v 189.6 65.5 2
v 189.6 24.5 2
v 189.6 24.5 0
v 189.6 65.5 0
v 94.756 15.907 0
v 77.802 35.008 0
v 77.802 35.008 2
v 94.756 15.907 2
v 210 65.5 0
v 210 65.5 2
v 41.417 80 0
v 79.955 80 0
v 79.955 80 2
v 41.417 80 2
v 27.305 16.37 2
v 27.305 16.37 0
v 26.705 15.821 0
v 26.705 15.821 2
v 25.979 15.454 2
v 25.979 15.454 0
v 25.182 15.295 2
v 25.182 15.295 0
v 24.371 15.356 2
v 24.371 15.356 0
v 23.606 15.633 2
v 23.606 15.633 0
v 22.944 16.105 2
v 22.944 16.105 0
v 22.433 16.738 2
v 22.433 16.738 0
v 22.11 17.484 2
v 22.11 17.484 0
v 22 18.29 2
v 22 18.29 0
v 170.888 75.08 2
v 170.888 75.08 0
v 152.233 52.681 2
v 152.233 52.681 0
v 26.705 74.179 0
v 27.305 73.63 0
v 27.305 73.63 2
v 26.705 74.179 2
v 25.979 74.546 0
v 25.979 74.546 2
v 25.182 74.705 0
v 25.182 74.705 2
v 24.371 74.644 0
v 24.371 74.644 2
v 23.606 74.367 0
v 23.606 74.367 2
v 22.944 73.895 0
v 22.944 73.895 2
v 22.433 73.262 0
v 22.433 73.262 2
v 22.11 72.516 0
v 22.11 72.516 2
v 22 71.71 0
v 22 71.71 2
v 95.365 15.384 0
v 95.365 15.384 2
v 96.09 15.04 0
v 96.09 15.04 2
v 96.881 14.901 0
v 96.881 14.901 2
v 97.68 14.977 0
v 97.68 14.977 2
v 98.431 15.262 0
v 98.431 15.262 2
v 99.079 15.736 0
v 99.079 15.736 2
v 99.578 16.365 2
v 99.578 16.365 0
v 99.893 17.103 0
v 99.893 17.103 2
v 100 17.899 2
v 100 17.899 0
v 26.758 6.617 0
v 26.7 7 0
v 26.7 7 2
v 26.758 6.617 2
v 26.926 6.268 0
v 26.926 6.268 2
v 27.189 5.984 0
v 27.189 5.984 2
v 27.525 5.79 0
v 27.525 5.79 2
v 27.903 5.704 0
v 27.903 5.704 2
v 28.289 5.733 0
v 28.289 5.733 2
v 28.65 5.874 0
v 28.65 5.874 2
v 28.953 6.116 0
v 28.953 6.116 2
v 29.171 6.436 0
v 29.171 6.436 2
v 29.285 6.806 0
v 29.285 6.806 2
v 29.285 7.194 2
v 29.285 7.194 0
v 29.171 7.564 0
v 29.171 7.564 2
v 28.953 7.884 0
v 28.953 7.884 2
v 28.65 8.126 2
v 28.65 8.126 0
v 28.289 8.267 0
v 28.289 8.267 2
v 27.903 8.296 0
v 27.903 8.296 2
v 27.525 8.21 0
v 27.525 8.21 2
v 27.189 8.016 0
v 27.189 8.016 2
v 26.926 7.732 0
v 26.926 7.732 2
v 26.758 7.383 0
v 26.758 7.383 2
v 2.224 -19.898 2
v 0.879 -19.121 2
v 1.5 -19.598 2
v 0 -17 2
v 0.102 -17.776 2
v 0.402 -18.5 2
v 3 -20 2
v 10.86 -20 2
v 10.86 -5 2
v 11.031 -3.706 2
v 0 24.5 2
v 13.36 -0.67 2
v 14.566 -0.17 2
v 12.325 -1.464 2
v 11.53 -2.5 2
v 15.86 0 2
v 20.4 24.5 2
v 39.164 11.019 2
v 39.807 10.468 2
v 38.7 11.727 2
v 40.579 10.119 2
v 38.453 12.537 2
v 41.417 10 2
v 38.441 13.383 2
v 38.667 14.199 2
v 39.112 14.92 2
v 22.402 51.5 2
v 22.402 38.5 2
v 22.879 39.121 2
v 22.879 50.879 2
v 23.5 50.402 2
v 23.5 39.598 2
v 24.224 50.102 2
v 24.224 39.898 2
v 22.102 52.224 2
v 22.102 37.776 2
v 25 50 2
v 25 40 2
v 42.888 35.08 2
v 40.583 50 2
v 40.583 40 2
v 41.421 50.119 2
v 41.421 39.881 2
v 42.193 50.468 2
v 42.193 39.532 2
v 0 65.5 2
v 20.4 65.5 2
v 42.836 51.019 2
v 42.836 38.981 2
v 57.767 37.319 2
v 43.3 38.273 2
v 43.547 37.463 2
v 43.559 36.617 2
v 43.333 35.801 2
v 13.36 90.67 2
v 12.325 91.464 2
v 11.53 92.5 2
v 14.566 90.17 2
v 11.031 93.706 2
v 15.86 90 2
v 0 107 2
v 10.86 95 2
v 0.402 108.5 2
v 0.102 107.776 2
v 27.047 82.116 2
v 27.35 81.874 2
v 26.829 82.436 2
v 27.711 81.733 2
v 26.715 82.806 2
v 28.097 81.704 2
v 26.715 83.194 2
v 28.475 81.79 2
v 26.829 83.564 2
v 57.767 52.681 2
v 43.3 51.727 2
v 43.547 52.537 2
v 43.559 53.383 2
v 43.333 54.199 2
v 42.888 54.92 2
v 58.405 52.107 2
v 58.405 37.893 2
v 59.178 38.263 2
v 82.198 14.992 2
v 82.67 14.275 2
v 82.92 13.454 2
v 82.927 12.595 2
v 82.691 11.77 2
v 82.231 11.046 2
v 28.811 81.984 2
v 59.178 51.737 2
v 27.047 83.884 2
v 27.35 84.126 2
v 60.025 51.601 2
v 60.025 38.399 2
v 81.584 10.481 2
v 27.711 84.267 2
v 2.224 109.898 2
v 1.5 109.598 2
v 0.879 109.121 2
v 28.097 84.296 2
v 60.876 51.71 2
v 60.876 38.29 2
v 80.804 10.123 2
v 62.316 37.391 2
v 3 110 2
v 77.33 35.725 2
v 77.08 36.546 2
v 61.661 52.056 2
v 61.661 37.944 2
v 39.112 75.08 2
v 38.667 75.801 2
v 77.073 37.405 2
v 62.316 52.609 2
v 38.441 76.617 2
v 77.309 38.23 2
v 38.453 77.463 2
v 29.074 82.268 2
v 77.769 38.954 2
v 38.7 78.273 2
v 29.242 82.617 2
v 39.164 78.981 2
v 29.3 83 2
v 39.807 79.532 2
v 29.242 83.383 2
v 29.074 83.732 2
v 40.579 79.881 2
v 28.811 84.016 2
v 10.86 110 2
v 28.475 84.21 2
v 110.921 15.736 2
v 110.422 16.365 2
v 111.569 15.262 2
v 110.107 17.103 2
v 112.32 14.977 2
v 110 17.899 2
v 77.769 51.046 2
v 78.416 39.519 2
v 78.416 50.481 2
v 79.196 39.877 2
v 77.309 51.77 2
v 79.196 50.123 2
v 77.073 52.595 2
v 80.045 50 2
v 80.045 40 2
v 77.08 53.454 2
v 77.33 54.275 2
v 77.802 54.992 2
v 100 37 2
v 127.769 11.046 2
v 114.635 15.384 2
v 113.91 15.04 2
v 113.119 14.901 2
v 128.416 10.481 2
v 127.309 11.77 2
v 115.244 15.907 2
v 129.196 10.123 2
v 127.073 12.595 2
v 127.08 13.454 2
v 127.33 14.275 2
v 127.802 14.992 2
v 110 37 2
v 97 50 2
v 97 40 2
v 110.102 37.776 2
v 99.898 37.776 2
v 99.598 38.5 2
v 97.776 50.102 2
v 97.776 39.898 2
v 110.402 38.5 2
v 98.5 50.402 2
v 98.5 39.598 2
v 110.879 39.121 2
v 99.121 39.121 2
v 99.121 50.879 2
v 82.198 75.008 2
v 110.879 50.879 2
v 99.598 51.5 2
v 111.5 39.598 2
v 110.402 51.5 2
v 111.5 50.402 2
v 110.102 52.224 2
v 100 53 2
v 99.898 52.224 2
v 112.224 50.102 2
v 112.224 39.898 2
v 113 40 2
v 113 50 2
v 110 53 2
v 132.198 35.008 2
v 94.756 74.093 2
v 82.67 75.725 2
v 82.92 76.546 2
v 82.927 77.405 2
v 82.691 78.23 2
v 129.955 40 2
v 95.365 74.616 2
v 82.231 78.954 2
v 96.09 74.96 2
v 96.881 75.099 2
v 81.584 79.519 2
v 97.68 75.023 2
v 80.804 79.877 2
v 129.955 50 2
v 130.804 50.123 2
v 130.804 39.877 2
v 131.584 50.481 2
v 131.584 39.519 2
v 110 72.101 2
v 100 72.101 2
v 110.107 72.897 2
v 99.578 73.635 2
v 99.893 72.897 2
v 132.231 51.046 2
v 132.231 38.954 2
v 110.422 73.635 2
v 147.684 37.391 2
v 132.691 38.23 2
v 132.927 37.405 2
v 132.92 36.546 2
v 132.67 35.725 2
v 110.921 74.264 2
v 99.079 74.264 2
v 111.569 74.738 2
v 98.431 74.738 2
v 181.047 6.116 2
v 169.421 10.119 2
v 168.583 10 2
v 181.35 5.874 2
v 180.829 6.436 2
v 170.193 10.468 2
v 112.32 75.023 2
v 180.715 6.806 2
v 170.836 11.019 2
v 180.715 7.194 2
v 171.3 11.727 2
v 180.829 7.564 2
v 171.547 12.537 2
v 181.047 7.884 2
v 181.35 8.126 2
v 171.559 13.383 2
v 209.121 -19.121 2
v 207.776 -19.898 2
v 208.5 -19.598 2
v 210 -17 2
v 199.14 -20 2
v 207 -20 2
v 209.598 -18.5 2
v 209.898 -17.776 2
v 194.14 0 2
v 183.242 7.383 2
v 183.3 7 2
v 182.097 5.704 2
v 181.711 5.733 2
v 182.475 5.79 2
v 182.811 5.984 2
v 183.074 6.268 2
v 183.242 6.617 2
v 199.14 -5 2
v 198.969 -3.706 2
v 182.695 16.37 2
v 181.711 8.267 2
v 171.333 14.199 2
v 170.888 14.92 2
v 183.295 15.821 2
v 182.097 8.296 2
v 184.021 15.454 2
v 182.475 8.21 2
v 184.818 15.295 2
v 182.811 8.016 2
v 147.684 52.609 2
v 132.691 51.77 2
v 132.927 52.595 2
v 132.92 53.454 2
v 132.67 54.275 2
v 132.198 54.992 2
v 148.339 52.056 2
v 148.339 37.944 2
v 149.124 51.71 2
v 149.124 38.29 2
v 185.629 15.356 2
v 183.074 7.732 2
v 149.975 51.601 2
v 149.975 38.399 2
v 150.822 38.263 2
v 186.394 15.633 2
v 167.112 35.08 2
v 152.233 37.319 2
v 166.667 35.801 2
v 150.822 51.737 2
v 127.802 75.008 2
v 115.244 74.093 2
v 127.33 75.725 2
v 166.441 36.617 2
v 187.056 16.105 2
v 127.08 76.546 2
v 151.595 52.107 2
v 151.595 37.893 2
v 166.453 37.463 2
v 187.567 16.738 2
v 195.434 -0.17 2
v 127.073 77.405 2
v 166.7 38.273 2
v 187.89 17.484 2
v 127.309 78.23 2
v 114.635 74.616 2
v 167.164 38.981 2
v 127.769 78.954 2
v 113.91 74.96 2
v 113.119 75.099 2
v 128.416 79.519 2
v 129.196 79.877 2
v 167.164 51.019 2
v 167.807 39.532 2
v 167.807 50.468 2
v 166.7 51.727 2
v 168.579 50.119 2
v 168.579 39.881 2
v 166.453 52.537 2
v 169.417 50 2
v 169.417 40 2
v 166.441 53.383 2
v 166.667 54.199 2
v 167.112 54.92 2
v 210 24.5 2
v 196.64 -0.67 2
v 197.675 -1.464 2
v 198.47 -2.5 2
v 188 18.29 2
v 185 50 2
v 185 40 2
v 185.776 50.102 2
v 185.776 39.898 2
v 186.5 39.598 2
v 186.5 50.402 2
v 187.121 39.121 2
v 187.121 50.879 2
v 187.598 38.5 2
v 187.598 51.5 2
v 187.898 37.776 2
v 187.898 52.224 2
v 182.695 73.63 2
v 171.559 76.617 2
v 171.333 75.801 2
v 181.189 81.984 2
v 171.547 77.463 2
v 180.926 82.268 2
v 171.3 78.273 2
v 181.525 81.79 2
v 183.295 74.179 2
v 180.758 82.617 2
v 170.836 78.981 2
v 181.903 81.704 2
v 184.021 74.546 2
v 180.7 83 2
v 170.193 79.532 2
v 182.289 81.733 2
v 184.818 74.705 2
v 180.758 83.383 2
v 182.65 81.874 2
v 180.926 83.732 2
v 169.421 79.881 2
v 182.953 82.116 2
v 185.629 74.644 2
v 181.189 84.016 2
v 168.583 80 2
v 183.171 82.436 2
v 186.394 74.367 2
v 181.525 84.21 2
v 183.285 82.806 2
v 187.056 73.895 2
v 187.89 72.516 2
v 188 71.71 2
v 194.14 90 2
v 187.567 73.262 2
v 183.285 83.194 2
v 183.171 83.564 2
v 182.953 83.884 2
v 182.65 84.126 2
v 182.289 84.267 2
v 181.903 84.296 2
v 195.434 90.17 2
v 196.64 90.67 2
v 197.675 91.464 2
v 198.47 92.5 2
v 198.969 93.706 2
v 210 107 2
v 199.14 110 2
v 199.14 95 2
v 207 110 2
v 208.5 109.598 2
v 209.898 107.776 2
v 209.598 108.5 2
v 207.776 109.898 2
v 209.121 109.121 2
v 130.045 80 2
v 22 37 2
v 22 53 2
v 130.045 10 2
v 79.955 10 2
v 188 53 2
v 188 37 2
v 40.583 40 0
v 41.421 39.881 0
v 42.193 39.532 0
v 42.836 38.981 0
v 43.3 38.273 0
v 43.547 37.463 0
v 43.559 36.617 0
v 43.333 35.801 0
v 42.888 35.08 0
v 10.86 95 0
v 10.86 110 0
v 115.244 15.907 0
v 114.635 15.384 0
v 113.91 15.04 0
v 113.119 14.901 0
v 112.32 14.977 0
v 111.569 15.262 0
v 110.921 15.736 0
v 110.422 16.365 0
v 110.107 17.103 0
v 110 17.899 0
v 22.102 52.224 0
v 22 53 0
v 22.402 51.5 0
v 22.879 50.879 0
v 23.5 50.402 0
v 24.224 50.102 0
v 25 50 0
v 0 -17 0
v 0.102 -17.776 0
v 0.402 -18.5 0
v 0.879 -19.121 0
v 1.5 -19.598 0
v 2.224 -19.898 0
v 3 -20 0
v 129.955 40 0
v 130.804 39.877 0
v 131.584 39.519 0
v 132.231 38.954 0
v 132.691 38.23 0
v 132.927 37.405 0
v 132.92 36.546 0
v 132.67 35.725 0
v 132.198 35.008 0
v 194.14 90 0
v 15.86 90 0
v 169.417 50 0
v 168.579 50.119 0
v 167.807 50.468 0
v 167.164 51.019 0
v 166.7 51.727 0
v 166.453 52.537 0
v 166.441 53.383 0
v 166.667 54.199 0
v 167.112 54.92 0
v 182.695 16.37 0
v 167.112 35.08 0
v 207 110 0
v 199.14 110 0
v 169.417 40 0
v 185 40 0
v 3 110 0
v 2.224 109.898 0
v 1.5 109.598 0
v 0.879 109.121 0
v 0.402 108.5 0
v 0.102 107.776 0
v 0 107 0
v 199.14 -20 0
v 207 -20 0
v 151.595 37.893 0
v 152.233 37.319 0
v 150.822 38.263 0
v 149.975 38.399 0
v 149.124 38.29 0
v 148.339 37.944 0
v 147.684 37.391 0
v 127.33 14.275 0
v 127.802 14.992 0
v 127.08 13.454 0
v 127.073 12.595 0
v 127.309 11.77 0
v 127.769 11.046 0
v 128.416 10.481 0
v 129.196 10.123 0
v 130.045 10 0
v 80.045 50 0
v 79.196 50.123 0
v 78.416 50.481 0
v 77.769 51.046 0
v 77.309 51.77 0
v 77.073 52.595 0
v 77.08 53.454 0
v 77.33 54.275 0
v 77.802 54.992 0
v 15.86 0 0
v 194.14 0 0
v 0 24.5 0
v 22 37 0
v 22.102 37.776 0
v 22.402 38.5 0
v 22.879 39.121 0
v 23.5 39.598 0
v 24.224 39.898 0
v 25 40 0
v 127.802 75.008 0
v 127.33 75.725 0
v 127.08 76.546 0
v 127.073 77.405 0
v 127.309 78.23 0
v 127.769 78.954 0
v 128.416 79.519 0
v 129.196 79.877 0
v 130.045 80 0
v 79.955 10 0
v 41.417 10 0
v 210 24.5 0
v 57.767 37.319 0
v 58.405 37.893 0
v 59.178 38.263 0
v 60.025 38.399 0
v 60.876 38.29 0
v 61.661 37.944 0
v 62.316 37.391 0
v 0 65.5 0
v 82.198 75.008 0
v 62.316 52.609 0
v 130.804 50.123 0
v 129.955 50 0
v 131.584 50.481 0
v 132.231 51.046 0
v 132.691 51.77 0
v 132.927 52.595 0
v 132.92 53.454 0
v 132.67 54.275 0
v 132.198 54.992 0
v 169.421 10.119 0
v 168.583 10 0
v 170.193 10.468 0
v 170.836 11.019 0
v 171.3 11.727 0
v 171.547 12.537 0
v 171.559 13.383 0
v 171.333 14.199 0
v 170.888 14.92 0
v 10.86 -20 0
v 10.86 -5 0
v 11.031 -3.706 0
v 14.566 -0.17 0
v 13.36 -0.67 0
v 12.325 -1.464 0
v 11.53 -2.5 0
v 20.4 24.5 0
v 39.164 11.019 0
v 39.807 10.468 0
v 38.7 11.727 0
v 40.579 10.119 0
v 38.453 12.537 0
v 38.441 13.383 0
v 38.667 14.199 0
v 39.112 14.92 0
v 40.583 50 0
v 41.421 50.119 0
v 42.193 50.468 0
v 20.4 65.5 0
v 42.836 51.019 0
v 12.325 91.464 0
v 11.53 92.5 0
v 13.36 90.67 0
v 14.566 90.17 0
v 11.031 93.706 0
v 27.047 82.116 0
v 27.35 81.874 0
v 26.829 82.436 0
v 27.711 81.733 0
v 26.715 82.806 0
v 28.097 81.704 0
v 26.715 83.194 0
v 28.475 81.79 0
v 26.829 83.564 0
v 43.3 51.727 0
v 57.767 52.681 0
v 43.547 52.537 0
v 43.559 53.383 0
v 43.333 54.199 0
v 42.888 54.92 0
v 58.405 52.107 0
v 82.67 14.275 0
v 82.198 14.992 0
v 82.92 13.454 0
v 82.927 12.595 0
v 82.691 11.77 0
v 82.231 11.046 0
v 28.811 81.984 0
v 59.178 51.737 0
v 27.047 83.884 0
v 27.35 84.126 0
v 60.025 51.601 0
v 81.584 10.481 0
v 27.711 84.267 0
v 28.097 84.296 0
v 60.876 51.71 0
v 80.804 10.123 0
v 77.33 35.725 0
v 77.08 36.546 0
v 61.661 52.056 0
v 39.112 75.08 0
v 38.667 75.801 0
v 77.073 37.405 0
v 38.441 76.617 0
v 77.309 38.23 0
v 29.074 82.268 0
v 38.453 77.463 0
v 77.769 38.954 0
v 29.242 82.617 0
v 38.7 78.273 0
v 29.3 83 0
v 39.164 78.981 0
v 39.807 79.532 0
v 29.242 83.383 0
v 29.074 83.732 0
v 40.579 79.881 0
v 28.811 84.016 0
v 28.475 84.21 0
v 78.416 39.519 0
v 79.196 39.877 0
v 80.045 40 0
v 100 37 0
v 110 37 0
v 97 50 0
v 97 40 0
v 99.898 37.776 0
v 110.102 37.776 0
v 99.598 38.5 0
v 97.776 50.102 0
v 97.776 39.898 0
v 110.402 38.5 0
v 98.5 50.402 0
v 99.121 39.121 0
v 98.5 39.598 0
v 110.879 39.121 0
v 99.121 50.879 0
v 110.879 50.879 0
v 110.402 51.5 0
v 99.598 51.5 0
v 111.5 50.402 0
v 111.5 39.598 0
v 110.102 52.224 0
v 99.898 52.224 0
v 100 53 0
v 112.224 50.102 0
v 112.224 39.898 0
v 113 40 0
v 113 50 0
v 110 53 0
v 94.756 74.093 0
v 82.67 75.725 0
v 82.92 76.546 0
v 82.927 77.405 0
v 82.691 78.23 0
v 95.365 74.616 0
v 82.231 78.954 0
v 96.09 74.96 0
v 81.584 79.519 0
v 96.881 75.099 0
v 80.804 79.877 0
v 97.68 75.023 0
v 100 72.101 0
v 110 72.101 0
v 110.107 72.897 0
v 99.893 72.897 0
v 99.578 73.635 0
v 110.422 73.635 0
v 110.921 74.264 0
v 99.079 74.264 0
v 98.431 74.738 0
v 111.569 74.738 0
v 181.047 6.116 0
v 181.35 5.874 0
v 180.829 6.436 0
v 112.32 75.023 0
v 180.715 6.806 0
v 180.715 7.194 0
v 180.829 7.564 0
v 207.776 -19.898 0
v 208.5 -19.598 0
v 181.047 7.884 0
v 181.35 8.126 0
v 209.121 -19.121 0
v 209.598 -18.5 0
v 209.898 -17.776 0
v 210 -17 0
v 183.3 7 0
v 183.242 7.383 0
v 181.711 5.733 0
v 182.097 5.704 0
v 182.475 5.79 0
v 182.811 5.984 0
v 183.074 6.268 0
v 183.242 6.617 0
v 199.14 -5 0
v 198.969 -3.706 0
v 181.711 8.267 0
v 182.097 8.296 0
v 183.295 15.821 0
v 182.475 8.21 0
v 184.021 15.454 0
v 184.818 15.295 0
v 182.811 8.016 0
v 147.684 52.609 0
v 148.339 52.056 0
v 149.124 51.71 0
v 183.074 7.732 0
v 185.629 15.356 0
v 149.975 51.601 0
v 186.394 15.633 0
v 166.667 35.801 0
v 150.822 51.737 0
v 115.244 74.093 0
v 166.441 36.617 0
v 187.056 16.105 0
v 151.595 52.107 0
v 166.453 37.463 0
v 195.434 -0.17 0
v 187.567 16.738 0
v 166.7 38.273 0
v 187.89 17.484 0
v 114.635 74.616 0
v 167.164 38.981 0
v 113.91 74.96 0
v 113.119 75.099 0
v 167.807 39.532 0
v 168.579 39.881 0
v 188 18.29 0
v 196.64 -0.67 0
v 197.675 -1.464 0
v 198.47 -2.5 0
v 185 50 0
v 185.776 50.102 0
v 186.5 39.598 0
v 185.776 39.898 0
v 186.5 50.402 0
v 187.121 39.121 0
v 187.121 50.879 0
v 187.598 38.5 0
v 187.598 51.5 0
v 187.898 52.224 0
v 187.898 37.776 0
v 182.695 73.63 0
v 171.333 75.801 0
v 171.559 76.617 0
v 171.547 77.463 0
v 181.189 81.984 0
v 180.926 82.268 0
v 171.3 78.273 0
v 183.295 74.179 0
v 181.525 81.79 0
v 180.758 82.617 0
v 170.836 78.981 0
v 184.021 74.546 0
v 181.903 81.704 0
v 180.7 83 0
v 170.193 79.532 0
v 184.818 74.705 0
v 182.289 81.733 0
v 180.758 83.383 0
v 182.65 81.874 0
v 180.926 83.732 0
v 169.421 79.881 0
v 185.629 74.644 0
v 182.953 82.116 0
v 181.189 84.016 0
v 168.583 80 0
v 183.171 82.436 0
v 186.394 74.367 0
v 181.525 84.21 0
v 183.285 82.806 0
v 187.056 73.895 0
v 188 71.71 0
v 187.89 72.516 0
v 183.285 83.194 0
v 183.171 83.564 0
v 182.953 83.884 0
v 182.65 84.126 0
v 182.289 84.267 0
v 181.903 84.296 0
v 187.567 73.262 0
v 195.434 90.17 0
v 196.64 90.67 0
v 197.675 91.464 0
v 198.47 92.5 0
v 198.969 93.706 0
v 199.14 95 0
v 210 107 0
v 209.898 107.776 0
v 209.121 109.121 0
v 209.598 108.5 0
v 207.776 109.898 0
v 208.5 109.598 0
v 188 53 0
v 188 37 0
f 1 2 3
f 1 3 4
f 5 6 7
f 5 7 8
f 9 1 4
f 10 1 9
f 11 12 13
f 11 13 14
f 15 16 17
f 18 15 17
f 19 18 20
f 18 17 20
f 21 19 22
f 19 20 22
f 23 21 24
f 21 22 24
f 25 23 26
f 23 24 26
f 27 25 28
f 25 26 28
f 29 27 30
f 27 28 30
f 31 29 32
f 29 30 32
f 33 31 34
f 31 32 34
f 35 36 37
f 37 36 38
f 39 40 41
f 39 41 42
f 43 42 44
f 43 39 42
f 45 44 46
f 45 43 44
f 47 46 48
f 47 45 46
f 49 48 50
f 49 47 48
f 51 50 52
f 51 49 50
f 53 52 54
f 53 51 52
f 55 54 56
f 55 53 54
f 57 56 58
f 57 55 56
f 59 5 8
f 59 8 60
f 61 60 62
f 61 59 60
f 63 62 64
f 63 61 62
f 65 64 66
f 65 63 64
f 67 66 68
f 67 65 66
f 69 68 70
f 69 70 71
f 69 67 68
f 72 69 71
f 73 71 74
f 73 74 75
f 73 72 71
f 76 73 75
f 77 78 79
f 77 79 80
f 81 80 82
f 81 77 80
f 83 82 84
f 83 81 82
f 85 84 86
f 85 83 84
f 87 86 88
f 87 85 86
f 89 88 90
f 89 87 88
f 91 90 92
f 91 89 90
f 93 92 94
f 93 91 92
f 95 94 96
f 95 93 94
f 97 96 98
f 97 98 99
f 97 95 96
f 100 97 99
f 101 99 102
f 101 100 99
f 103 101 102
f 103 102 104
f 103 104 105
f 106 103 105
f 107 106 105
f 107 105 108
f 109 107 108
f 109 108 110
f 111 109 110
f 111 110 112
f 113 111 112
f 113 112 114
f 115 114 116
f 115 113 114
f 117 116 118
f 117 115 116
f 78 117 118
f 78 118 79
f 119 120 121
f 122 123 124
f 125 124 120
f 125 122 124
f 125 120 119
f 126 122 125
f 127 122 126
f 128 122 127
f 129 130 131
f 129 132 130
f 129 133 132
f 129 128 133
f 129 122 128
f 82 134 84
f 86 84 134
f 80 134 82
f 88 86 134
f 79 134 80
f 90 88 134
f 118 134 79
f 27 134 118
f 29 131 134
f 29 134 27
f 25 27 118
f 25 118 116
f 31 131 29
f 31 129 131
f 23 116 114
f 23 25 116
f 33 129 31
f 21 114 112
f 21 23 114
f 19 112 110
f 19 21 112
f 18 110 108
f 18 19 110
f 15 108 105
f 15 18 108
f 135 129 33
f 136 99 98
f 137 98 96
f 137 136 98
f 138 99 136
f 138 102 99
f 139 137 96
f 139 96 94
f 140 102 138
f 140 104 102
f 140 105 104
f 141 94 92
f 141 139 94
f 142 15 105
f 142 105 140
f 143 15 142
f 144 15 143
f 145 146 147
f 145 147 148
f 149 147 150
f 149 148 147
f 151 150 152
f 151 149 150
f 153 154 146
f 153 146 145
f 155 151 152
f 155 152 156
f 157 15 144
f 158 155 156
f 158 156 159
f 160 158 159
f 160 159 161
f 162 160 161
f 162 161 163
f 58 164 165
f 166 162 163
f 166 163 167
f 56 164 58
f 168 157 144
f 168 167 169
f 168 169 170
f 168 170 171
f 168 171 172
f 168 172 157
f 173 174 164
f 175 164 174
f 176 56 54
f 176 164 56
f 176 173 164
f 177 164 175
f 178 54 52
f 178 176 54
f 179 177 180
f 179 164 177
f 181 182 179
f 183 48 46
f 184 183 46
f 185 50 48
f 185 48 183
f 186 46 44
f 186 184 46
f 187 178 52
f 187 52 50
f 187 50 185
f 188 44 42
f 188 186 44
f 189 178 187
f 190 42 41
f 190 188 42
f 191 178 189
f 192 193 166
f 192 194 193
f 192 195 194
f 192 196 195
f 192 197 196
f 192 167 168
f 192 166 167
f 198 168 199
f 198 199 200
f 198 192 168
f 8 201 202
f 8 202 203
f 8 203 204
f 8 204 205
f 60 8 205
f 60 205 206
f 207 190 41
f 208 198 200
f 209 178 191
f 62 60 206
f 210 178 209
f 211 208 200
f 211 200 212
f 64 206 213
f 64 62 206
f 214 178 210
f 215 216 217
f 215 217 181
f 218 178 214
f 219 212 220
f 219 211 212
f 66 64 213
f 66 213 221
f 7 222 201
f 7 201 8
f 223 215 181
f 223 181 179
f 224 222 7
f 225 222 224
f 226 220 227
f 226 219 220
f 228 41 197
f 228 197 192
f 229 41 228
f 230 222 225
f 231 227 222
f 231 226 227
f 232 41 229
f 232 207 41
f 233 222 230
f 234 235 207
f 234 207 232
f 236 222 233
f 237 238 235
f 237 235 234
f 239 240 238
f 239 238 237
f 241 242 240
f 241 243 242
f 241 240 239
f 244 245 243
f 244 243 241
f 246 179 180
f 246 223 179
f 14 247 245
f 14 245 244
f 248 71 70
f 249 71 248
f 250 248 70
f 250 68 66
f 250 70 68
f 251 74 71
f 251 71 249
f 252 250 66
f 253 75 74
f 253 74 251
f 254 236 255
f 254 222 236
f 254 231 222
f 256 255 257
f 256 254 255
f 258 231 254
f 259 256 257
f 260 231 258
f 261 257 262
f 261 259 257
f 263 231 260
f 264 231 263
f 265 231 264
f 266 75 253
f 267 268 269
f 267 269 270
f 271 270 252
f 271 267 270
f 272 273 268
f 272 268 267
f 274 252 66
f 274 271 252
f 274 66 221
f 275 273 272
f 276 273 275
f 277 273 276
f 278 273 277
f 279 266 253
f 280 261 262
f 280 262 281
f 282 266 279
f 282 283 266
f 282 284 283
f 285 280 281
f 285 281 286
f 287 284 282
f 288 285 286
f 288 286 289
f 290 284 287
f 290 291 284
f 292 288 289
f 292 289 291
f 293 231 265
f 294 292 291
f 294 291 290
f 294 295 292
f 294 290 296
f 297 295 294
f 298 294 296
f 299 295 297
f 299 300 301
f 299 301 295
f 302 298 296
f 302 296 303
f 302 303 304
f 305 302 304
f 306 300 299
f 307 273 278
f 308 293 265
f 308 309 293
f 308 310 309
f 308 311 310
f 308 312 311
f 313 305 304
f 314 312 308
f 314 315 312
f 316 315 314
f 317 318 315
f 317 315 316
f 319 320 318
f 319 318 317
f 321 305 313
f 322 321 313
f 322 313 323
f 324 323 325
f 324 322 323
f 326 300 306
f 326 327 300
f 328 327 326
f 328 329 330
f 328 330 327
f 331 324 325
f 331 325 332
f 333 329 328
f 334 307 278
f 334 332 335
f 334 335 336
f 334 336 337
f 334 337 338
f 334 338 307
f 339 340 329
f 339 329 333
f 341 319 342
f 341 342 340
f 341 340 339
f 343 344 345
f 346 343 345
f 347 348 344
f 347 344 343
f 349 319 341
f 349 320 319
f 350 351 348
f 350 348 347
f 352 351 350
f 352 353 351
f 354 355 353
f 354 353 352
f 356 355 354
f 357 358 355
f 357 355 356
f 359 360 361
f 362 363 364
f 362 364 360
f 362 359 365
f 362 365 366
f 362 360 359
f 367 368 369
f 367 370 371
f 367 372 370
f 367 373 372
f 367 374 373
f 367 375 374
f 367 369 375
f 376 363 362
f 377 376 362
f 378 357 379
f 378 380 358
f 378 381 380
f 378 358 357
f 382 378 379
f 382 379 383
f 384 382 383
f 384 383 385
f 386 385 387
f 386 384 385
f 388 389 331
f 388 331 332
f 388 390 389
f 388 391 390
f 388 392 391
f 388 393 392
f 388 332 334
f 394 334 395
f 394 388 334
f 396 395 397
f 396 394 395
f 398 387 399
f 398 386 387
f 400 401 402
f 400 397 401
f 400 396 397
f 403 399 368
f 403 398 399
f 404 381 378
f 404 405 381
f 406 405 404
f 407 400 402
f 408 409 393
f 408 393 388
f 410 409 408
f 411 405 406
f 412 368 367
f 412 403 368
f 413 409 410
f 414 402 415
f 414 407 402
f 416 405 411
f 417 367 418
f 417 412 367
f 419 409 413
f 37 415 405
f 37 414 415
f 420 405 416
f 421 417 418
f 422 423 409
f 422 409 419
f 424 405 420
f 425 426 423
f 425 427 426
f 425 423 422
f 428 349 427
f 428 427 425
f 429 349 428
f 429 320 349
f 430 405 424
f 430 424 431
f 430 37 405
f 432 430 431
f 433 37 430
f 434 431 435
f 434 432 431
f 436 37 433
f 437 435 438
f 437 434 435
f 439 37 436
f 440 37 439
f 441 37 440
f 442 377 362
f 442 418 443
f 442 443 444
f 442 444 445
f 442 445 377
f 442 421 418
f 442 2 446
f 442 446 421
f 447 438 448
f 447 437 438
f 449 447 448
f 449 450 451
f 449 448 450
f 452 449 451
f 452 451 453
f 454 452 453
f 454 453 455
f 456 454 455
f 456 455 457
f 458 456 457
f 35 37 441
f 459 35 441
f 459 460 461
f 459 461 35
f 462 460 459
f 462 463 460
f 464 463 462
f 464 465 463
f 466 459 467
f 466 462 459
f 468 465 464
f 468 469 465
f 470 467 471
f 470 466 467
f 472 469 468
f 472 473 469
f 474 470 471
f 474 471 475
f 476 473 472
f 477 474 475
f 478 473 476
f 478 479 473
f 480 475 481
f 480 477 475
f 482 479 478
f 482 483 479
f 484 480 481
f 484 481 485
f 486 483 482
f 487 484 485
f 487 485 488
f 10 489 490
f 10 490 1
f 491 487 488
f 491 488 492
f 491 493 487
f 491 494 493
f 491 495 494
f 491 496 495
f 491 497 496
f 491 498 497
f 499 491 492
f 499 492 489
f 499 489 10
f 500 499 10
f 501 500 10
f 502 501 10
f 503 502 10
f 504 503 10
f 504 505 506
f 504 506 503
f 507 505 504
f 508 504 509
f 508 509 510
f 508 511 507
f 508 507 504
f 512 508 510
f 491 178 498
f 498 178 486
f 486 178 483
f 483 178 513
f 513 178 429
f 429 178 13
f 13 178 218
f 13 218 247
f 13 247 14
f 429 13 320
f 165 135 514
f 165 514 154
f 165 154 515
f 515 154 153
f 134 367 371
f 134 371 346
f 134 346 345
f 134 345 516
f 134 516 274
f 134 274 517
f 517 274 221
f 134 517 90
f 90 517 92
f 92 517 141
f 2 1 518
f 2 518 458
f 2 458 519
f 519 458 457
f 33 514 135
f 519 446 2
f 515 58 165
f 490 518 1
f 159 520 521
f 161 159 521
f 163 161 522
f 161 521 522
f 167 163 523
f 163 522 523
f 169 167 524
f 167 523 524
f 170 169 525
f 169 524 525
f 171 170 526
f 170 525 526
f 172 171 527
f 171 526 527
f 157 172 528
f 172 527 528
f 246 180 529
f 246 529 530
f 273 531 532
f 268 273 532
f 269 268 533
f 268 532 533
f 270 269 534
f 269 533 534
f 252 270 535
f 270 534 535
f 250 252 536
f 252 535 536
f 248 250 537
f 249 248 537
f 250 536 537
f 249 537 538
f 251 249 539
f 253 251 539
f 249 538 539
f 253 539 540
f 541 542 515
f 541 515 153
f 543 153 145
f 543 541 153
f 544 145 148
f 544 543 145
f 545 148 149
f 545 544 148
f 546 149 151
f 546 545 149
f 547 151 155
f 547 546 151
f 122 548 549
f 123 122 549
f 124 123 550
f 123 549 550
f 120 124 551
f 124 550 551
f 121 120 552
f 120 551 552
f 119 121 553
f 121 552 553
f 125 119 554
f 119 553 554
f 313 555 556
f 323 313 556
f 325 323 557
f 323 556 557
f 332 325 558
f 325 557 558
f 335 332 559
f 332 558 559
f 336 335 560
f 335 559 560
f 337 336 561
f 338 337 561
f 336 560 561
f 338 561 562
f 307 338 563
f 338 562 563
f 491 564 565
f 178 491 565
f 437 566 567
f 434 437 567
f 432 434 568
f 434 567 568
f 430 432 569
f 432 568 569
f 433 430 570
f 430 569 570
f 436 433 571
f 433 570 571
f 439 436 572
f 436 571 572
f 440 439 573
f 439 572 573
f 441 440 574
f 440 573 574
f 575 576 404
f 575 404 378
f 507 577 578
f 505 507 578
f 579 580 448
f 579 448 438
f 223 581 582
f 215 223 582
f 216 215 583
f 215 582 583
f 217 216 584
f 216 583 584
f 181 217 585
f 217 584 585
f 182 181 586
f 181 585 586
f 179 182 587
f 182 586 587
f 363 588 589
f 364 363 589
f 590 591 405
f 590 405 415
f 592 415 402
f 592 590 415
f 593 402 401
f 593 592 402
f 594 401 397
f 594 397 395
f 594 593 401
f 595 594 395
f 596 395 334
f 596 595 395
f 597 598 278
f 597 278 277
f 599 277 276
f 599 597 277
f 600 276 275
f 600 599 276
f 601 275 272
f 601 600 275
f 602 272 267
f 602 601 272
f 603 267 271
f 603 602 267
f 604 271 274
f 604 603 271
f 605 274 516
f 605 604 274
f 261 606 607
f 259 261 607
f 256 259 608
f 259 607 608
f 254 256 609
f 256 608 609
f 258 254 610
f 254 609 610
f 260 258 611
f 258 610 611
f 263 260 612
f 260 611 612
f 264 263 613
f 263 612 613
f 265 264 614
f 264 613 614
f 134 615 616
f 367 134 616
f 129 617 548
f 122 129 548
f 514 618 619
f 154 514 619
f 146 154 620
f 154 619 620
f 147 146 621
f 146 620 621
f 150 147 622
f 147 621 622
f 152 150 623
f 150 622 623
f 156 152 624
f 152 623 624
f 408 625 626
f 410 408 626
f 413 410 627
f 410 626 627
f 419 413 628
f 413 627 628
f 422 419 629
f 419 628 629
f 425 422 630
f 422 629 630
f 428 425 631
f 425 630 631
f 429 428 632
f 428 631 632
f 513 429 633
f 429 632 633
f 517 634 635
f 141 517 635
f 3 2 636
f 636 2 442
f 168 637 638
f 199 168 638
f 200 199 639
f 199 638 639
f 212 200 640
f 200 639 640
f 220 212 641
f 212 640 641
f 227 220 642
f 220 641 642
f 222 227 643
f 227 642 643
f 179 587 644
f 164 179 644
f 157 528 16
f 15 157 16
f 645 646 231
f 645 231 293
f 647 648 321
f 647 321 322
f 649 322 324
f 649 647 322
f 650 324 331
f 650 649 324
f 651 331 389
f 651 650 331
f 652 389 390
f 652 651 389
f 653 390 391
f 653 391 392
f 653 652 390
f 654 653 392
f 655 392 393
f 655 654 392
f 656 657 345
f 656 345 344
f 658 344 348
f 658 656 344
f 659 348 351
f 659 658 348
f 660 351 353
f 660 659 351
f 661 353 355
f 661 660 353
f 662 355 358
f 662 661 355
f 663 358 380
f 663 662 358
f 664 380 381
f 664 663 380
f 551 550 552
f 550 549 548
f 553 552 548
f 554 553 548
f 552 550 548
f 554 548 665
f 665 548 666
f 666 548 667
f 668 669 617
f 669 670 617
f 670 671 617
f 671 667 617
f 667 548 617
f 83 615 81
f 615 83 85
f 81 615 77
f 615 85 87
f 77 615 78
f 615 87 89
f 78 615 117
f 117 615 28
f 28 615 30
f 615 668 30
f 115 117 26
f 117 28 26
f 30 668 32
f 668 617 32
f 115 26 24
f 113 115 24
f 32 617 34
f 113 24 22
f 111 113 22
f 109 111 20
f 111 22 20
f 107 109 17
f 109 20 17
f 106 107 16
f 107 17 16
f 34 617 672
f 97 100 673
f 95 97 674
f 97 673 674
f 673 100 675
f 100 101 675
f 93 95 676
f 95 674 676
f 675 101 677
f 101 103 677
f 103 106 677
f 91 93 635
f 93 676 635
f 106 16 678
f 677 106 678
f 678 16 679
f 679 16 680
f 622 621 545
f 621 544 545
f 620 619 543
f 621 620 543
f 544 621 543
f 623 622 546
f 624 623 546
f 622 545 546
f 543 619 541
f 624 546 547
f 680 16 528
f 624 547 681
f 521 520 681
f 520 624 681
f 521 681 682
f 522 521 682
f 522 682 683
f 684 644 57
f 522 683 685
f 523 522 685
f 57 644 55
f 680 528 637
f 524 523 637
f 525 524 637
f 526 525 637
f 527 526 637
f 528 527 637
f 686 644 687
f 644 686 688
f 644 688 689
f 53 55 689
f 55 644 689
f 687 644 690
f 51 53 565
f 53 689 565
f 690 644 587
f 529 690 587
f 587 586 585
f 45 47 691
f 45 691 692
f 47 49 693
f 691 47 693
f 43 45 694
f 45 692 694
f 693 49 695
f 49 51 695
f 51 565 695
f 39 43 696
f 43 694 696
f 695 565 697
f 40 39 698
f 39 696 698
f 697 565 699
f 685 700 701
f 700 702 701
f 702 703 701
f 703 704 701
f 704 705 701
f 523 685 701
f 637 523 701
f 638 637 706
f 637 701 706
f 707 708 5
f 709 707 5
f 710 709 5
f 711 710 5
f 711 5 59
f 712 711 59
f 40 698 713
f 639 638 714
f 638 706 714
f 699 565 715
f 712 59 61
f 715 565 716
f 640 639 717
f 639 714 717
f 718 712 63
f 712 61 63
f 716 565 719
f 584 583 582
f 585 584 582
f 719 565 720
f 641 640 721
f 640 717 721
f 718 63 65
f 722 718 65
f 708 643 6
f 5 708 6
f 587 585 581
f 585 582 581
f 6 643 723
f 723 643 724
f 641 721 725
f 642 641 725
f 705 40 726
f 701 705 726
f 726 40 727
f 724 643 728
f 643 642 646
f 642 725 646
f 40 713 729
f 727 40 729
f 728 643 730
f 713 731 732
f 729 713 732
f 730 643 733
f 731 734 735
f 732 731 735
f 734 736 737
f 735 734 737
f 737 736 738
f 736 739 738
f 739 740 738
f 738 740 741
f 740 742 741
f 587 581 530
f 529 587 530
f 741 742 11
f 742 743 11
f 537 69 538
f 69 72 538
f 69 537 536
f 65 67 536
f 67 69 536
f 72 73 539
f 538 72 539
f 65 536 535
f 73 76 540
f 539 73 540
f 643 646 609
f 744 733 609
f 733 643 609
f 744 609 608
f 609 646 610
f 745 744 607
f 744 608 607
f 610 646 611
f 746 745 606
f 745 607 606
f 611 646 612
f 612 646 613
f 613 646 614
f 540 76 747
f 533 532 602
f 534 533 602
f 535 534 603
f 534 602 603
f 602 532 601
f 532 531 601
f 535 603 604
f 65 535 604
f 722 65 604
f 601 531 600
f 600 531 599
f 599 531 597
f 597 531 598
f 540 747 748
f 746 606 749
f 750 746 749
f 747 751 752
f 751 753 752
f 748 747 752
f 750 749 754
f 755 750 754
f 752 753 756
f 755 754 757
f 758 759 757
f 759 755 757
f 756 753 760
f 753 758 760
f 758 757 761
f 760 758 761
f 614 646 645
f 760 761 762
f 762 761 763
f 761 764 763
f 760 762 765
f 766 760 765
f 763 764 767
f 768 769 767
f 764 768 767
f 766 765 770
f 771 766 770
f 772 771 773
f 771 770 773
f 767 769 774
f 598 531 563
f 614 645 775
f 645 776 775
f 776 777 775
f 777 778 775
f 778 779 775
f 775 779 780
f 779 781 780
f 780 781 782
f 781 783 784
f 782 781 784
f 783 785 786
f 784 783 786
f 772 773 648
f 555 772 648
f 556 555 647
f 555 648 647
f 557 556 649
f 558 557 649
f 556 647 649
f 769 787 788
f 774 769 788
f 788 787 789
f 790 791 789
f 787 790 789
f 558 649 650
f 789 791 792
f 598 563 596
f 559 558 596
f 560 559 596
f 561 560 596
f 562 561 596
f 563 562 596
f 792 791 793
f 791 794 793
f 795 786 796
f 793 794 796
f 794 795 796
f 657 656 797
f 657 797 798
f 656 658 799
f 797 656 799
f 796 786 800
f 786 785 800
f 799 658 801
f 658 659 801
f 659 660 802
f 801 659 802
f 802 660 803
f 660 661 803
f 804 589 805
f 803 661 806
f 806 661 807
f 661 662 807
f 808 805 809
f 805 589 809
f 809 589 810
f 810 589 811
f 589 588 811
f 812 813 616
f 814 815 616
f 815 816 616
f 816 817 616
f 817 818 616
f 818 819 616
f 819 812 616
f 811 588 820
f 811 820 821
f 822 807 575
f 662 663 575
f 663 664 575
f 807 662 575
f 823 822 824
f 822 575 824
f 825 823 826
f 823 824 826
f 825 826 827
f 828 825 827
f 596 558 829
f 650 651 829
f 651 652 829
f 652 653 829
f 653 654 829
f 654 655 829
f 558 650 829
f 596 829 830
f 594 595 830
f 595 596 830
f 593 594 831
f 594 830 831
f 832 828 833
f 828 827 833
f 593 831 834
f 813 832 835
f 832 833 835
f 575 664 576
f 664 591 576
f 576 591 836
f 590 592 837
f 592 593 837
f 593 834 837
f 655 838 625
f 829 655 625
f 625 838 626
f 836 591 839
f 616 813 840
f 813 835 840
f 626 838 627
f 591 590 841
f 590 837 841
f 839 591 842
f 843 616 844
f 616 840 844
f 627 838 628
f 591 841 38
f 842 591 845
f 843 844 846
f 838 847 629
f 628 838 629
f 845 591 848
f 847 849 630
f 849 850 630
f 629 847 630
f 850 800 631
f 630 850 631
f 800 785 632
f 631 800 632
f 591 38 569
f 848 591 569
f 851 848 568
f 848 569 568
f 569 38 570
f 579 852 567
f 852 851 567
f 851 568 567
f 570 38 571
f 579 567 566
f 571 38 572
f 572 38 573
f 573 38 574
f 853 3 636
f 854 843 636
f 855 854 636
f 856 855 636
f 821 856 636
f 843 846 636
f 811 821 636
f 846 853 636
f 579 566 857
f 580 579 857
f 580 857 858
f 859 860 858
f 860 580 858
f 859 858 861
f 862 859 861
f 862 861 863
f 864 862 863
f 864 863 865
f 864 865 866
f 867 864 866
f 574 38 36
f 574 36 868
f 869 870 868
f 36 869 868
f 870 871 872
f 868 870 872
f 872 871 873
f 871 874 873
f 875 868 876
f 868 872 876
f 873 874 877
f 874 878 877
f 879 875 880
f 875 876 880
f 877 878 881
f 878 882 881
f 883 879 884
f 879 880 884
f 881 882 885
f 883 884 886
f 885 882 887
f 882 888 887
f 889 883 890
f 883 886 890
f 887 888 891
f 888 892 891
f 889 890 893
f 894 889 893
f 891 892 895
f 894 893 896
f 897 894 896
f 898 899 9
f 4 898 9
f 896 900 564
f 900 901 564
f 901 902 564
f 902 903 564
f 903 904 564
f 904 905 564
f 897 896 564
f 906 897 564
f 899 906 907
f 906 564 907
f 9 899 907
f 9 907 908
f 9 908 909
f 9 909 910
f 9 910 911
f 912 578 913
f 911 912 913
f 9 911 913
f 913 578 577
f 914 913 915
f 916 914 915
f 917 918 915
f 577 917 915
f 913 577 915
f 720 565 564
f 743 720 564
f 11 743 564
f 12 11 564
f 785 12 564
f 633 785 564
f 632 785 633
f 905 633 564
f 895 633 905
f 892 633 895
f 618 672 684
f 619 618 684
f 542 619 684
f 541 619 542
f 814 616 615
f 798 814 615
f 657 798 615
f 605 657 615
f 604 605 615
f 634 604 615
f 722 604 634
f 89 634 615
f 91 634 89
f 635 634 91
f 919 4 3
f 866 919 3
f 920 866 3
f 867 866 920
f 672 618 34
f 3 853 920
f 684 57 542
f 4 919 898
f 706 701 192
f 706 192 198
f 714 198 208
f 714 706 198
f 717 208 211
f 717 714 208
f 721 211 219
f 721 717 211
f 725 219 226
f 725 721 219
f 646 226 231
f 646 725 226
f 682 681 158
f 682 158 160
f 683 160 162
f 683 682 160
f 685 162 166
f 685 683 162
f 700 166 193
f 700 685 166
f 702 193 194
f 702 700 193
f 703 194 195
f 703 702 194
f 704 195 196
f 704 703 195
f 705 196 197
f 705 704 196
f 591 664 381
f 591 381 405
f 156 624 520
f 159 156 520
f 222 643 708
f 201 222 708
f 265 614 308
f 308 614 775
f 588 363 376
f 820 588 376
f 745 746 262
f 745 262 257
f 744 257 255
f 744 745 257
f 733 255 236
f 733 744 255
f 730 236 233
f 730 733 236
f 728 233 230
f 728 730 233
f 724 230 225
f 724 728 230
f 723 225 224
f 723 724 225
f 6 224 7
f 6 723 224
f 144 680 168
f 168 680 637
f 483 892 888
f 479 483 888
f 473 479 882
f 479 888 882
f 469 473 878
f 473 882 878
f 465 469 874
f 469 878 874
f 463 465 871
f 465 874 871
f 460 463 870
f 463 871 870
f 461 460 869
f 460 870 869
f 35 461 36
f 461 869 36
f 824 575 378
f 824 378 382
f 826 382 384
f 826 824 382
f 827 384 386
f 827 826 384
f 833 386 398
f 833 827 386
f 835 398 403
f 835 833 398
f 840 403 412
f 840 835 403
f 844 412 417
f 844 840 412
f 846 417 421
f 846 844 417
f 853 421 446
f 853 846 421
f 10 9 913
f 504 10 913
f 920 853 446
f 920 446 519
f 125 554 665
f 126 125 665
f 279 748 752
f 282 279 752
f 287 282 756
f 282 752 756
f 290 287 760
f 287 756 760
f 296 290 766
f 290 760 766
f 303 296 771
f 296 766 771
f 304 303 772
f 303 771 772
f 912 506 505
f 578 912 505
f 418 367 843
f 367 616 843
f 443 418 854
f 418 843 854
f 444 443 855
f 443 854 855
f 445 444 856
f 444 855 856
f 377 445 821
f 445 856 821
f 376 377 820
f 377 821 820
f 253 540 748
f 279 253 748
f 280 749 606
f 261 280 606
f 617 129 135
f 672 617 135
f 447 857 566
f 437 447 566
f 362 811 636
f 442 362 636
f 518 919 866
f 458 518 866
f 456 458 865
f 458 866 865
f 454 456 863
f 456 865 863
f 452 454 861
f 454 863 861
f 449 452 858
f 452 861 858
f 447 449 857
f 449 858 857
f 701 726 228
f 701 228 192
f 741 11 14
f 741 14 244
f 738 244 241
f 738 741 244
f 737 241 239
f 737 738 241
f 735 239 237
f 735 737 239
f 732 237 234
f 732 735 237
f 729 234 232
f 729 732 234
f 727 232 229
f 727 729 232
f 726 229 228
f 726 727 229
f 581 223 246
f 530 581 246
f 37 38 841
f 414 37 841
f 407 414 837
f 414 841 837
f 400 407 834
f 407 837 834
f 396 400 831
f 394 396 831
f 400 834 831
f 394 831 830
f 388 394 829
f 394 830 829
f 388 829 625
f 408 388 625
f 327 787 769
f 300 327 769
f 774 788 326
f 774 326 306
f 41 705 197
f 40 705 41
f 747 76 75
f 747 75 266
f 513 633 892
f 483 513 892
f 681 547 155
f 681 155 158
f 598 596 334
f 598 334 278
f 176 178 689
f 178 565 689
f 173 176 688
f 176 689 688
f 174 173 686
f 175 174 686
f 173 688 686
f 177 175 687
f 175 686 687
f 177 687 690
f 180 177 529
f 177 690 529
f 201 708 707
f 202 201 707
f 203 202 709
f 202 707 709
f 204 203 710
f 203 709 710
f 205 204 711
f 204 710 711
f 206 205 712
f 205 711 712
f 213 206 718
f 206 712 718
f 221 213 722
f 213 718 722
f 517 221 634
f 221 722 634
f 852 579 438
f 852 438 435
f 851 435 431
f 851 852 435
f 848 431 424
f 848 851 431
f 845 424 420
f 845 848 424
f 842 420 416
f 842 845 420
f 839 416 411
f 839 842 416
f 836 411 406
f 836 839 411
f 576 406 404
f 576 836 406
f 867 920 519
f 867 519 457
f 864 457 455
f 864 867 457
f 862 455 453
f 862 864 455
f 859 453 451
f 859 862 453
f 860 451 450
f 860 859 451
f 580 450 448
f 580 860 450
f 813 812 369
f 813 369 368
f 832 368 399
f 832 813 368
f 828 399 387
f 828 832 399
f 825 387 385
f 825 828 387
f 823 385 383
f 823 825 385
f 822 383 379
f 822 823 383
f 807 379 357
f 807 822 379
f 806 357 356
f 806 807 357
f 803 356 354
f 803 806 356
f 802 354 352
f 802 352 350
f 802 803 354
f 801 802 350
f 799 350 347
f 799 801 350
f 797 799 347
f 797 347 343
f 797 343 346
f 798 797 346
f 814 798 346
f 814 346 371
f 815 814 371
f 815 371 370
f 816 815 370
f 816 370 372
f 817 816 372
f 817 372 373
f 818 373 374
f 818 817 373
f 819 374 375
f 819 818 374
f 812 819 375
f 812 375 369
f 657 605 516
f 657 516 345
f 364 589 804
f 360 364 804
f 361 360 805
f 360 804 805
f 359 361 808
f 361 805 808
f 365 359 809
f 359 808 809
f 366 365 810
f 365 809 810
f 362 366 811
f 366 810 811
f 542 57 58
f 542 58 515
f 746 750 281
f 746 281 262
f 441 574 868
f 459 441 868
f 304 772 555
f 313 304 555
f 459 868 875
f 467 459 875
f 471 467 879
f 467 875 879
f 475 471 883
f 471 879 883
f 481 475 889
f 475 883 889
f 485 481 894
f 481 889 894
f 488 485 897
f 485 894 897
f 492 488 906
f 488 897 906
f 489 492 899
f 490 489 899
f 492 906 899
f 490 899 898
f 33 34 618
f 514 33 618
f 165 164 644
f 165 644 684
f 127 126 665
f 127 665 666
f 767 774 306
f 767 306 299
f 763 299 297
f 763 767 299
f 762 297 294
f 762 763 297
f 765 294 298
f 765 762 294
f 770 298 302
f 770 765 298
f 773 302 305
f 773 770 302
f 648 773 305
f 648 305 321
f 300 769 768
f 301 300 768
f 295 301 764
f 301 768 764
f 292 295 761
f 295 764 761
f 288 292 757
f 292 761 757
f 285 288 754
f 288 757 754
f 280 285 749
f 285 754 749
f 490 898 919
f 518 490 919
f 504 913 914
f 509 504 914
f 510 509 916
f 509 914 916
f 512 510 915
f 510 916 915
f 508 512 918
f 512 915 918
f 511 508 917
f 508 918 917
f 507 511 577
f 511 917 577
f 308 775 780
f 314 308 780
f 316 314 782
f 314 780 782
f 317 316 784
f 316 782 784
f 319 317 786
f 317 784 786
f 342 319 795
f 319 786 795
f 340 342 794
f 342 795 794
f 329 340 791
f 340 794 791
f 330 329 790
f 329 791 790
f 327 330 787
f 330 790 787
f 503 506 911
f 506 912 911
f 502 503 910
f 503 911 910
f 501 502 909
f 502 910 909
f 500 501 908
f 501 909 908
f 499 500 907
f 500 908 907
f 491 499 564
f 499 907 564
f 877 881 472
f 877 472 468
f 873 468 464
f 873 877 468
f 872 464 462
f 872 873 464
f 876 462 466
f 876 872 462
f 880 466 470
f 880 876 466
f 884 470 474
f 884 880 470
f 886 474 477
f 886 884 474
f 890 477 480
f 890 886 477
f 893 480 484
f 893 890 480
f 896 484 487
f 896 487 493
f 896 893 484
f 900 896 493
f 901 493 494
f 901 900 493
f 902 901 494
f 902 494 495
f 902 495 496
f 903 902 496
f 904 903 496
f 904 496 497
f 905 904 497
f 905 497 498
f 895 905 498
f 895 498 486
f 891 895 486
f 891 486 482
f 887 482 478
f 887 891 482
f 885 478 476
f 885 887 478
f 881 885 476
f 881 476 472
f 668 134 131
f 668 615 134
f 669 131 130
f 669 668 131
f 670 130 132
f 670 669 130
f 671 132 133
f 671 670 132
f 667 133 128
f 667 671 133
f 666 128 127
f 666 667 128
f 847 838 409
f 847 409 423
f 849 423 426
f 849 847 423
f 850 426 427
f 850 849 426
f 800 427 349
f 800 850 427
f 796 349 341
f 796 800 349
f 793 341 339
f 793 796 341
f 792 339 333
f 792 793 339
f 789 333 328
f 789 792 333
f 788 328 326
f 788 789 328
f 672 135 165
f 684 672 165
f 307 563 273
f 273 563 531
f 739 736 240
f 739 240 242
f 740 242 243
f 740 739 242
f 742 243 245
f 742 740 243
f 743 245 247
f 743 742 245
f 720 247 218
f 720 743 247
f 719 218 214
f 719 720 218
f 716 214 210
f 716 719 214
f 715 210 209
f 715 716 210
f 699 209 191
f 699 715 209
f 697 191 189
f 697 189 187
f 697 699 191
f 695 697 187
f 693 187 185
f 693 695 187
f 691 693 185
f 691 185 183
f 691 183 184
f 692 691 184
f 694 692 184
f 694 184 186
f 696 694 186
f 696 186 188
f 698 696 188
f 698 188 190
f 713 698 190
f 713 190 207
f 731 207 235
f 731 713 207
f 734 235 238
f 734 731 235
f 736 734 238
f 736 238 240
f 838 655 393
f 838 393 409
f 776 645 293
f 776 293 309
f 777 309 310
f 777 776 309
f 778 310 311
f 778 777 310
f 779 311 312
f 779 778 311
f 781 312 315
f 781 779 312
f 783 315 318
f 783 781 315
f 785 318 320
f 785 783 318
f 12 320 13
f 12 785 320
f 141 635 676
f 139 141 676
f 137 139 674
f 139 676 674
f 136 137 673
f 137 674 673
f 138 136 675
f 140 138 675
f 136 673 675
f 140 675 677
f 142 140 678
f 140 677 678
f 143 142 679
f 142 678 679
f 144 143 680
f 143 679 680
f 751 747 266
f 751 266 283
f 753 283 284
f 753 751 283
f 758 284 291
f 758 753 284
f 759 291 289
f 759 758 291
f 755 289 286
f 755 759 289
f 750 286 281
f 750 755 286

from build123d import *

# Parameters (mm, degrees)
SKETCH_1_R          = 1.75
SKETCH_1_R_2        = 1.3
EXTRUDE_1_DEPTH     = 2
SKETCH_2_W          = 20.4
SKETCH_2_H          = 41
CUT_EXTRUDE_1_DEPTH = 238.073828163
SKETCH_3_W          = 6.060289077
SKETCH_3_H          = 20
EXTRUDE_2_DEPTH     = 2
FILLET_3_R          = 5
FILLET_4_R          = 5
FILLET_5_R          = 5
FILLET_6_R          = 5


with BuildPart() as part:
    # 草图1 → 凸台-拉伸1 (new body)
    with BuildSketch(Plane.XY):
        with BuildLine():
            Line((7.8, 0), (202.2, 0))
            ThreePointArc((202.2, 0), (204.321320344, -0.878679656), (205.2, -3))
            Line((205.2, -3), (205.2, -20))
            Line((205.2, -20), (207, -20))
            ThreePointArc((207, -20), (209.121320344, -19.121320344), (210, -17))
            Line((210, -17), (210, 0))
            Line((210, 0), (210, 90))
            Line((210, 90), (210, 107))
            ThreePointArc((210, 107), (209.121320344, 109.121320344), (207, 110))
            Line((207, 110), (205.2, 110))
            Line((205.2, 110), (205.2, 93))
            ThreePointArc((205.2, 93), (204.321320344, 90.878679656), (202.2, 90))
            Line((202.2, 90), (7.8, 90))
            ThreePointArc((7.8, 90), (5.678679656, 90.878679656), (4.8, 93))
            Line((4.8, 93), (4.8, 110))
            Line((4.8, 110), (3, 110))
            ThreePointArc((3, 110), (0.878679656, 109.121320344), (0, 107))
            Line((0, 107), (0, 90))
            Line((0, 90), (0, 0))
            Line((0, 0), (0, -17))
            ThreePointArc((0, -17), (0.878679656, -19.121320344), (3, -20))
            Line((3, -20), (4.8, -20))
            Line((4.8, -20), (4.8, -3))
            ThreePointArc((4.8, -3), (5.678679656, -0.878679656), (7.8, 0))
        make_face()
        with Locations((2.5, 53)):
            Circle(SKETCH_1_R, mode=Mode.SUBTRACT)
        with Locations(Location((17.5, 53, 0), (0, 0, 180))):
            Circle(SKETCH_1_R, mode=Mode.SUBTRACT)
        with Locations((17.5, 37)):
            Circle(SKETCH_1_R, mode=Mode.SUBTRACT)
        with Locations(Location((2.5, 37, 0), (0, 0, 180))):
            Circle(SKETCH_1_R, mode=Mode.SUBTRACT)
        with Locations((207.5, 37)):
            Circle(SKETCH_1_R, mode=Mode.SUBTRACT)
        with Locations(Location((192.5, 37, 0), (0, 0, 180))):
            Circle(SKETCH_1_R, mode=Mode.SUBTRACT)
        with Locations((192.5, 53)):
            Circle(SKETCH_1_R, mode=Mode.SUBTRACT)
        with Locations(Location((207.5, 53, 0), (0, 0, 180))):
            Circle(SKETCH_1_R, mode=Mode.SUBTRACT)
        with Locations((28, 83)):
            Circle(SKETCH_1_R_2, mode=Mode.SUBTRACT)
        with Locations(Location((182, 83, 0), (0, 0, 180))):
            Circle(SKETCH_1_R_2, mode=Mode.SUBTRACT)
        with Locations((182, 7)):
            Circle(SKETCH_1_R_2, mode=Mode.SUBTRACT)
        with Locations(Location((28, 7, 0), (0, 0, 180))):
            Circle(SKETCH_1_R_2, mode=Mode.SUBTRACT)
        with BuildLine():
            Line((22, 71.710263165), (22, 53))
            ThreePointArc((22, 53), (22.878679656, 50.878679656), (25, 50))
            Line((25, 50), (40.583105292, 50))
            ThreePointArc((40.583105292, 50), (43.299697276, 51.727157515), (42.888301086, 54.919914673))
            Line((42.888301086, 54.919914673), (27.305195794, 73.630177837))
            ThreePointArc((27.305195794, 73.630177837), (23.979114939, 74.531219331), (22, 71.710263165))
        make_face(mode=Mode.SUBTRACT)
        with BuildLine():
            Line((39.111698914, 75.080085327), (57.767217115, 52.680849201))
            ThreePointArc((57.767217115, 52.680849201), (60.025200787, 51.601135394), (62.316045524, 52.60925372))
            Line((62.316045524, 52.60925372), (82.19822493, 75.008489847))
            ThreePointArc((82.19822493, 75.008489847), (82.690879074, 78.229932832), (79.954592315, 80))
            Line((79.954592315, 80), (41.416894708, 80))
            ThreePointArc((41.416894708, 80), (38.700302724, 78.272842485), (39.111698914, 75.080085327))
        make_face(mode=Mode.SUBTRACT)
        with BuildLine():
            Line((100, 72.101020514), (100, 53))
            ThreePointArc((100, 53), (99.121320344, 50.878679656), (97, 50))
            Line((97, 50), (80.045407685, 50))
            ThreePointArc((80.045407685, 50), (77.309120926, 51.770067168), (77.80177507, 54.991510153))
            Line((77.80177507, 54.991510153), (94.756367385, 74.092530668))
            ThreePointArc((94.756367385, 74.092530668), (98.065153077, 74.905561283), (100, 72.101020514))
        make_face(mode=Mode.SUBTRACT)
        with BuildLine():
            Line((113, 50), (129.954592315, 50))
            ThreePointArc((129.954592315, 50), (132.690879074, 51.770067168), (132.19822493, 54.991510153))
            Line((132.19822493, 54.991510153), (115.243632615, 74.092530668))
            ThreePointArc((115.243632615, 74.092530668), (111.934846923, 74.905561283), (110, 72.101020514))
            Line((110, 72.101020514), (110, 53))
            ThreePointArc((110, 53), (110.878679656, 50.878679656), (113, 50))
        make_face(mode=Mode.SUBTRACT)
        with BuildLine():
            Line((147.683954476, 52.60925372), (127.80177507, 75.008489847))
            ThreePointArc((127.80177507, 75.008489847), (127.309120926, 78.229932832), (130.045407685, 80))
            Line((130.045407685, 80), (168.583105292, 80))
            ThreePointArc((168.583105292, 80), (171.299697276, 78.272842485), (170.888301086, 75.080085327))
            Line((170.888301086, 75.080085327), (152.232782885, 52.680849201))
            ThreePointArc((152.232782885, 52.680849201), (149.974799213, 51.601135394), (147.683954476, 52.60925372))
        make_face(mode=Mode.SUBTRACT)
        with BuildLine():
            Line((167.111698914, 54.919914673), (182.694804206, 73.630177837))
            ThreePointArc((182.694804206, 73.630177837), (186.020885061, 74.531219331), (188, 71.710263165))
            Line((188, 71.710263165), (188, 53))
            ThreePointArc((188, 53), (187.121320344, 50.878679656), (185, 50))
            Line((185, 50), (169.416894708, 50))
            ThreePointArc((169.416894708, 50), (166.700302724, 51.727157515), (167.111698914, 54.919914673))
        make_face(mode=Mode.SUBTRACT)
        with BuildLine():
            Line((185, 40), (169.416894708, 40))
            ThreePointArc((169.416894708, 40), (166.700302724, 38.272842485), (167.111698914, 35.080085327))
            Line((167.111698914, 35.080085327), (182.694804206, 16.369822163))
            ThreePointArc((182.694804206, 16.369822163), (186.020885061, 15.468780669), (188, 18.289736835))
            Line((188, 18.289736835), (188, 37))
            ThreePointArc((188, 37), (187.121320344, 39.121320344), (185, 40))
        make_face(mode=Mode.SUBTRACT)
        with BuildLine():
            Line((170.888301086, 14.919914673), (152.232782885, 37.319150799))
            ThreePointArc((152.232782885, 37.319150799), (149.974799213, 38.398864606), (147.683954476, 37.39074628))
            Line((147.683954476, 37.39074628), (127.80177507, 14.991510153))
            ThreePointArc((127.80177507, 14.991510153), (127.309120926, 11.770067168), (130.045407685, 10))
            Line((130.045407685, 10), (168.583105292, 10))
            ThreePointArc((168.583105292, 10), (171.299697276, 11.727157515), (170.888301086, 14.919914673))
        make_face(mode=Mode.SUBTRACT)
        with BuildLine():
            Line((113, 40), (129.954592315, 40))
            ThreePointArc((129.954592315, 40), (132.690879074, 38.229932832), (132.19822493, 35.008489847))
            Line((132.19822493, 35.008489847), (115.243632615, 15.907469332))
            ThreePointArc((115.243632615, 15.907469332), (111.934846923, 15.094438717), (110, 17.898979486))
            Line((110, 17.898979486), (110, 37))
            ThreePointArc((110, 37), (110.878679656, 39.121320344), (113, 40))
        make_face(mode=Mode.SUBTRACT)
        with BuildLine():
            Line((97, 40), (80.045407685, 40))
            ThreePointArc((80.045407685, 40), (77.309120926, 38.229932832), (77.80177507, 35.008489847))
            Line((77.80177507, 35.008489847), (94.756367385, 15.907469332))
            ThreePointArc((94.756367385, 15.907469332), (98.065153077, 15.094438717), (100, 17.898979486))
            Line((100, 17.898979486), (100, 37))
            ThreePointArc((100, 37), (99.121320344, 39.121320344), (97, 40))
        make_face(mode=Mode.SUBTRACT)
        with BuildLine():
            Line((62.316045524, 37.39074628), (82.19822493, 14.991510153))
            ThreePointArc((82.19822493, 14.991510153), (82.690879074, 11.770067168), (79.954592315, 10))
            Line((79.954592315, 10), (41.416894708, 10))
            ThreePointArc((41.416894708, 10), (38.700302724, 11.727157515), (39.111698914, 14.919914673))
            Line((39.111698914, 14.919914673), (57.767217115, 37.319150799))
            ThreePointArc((57.767217115, 37.319150799), (60.025200787, 38.398864606), (62.316045524, 37.39074628))
        make_face(mode=Mode.SUBTRACT)
        with BuildLine():
            Line((42.888301086, 35.080085327), (27.305195794, 16.369822163))
            ThreePointArc((27.305195794, 16.369822163), (23.979114939, 15.468780669), (22, 18.289736835))
            Line((22, 18.289736835), (22, 37))
            ThreePointArc((22, 37), (22.878679656, 39.121320344), (25, 40))
            Line((25, 40), (40.583105292, 40))
            ThreePointArc((40.583105292, 40), (43.299697276, 38.272842485), (42.888301086, 35.080085327))
        make_face(mode=Mode.SUBTRACT)
    extrude(amount=EXTRUDE_1_DEPTH)

    # 草图2 → 切除-拉伸1 (cut, through all)
    with BuildSketch(Plane.XY.offset(2)):
        with Locations((10.2, 45)):
            Rectangle(SKETCH_2_W, SKETCH_2_H)
        with Locations((199.8, 45)):
            Rectangle(SKETCH_2_W, SKETCH_2_H)
    extrude(amount=-CUT_EXTRUDE_1_DEPTH, mode=Mode.SUBTRACT)

    # 草图3 → 凸台-拉伸2 (add)
    with BuildSketch(Plane.XY.offset(2)):
        with Locations((7.830144539, 100)):
            Rectangle(SKETCH_3_W, SKETCH_3_H)
        with Locations((202.169855462, 100)):
            Rectangle(SKETCH_3_W, SKETCH_3_H)
        with Locations((202.169855462, -10)):
            Rectangle(SKETCH_3_W, SKETCH_3_H)
        with Locations((7.830144539, -10)):
            Rectangle(SKETCH_3_W, SKETCH_3_H)
    extrude(amount=-EXTRUDE_2_DEPTH)

    # 圆角3
    fillet_3_edges = [part.edges().sort_by_distance(p)[0] for p in [
        (10.860289077, 0, 1),
    ]]
    fillet(fillet_3_edges, radius=FILLET_3_R)

    # 圆角4
    fillet_4_edges = [part.edges().sort_by_distance(p)[0] for p in [
        (199.139710923, 0, 1),
    ]]
    fillet(fillet_4_edges, radius=FILLET_4_R)

    # 圆角5
    fillet_5_edges = [part.edges().sort_by_distance(p)[0] for p in [
        (199.139710923, 90, 1),
    ]]
    fillet(fillet_5_edges, radius=FILLET_5_R)

    # 圆角6
    fillet_6_edges = [part.edges().sort_by_distance(p)[0] for p in [
        (10.860289077, 90, 1),
    ]]
    fillet(fillet_6_edges, radius=FILLET_6_R)


solid = part.part
